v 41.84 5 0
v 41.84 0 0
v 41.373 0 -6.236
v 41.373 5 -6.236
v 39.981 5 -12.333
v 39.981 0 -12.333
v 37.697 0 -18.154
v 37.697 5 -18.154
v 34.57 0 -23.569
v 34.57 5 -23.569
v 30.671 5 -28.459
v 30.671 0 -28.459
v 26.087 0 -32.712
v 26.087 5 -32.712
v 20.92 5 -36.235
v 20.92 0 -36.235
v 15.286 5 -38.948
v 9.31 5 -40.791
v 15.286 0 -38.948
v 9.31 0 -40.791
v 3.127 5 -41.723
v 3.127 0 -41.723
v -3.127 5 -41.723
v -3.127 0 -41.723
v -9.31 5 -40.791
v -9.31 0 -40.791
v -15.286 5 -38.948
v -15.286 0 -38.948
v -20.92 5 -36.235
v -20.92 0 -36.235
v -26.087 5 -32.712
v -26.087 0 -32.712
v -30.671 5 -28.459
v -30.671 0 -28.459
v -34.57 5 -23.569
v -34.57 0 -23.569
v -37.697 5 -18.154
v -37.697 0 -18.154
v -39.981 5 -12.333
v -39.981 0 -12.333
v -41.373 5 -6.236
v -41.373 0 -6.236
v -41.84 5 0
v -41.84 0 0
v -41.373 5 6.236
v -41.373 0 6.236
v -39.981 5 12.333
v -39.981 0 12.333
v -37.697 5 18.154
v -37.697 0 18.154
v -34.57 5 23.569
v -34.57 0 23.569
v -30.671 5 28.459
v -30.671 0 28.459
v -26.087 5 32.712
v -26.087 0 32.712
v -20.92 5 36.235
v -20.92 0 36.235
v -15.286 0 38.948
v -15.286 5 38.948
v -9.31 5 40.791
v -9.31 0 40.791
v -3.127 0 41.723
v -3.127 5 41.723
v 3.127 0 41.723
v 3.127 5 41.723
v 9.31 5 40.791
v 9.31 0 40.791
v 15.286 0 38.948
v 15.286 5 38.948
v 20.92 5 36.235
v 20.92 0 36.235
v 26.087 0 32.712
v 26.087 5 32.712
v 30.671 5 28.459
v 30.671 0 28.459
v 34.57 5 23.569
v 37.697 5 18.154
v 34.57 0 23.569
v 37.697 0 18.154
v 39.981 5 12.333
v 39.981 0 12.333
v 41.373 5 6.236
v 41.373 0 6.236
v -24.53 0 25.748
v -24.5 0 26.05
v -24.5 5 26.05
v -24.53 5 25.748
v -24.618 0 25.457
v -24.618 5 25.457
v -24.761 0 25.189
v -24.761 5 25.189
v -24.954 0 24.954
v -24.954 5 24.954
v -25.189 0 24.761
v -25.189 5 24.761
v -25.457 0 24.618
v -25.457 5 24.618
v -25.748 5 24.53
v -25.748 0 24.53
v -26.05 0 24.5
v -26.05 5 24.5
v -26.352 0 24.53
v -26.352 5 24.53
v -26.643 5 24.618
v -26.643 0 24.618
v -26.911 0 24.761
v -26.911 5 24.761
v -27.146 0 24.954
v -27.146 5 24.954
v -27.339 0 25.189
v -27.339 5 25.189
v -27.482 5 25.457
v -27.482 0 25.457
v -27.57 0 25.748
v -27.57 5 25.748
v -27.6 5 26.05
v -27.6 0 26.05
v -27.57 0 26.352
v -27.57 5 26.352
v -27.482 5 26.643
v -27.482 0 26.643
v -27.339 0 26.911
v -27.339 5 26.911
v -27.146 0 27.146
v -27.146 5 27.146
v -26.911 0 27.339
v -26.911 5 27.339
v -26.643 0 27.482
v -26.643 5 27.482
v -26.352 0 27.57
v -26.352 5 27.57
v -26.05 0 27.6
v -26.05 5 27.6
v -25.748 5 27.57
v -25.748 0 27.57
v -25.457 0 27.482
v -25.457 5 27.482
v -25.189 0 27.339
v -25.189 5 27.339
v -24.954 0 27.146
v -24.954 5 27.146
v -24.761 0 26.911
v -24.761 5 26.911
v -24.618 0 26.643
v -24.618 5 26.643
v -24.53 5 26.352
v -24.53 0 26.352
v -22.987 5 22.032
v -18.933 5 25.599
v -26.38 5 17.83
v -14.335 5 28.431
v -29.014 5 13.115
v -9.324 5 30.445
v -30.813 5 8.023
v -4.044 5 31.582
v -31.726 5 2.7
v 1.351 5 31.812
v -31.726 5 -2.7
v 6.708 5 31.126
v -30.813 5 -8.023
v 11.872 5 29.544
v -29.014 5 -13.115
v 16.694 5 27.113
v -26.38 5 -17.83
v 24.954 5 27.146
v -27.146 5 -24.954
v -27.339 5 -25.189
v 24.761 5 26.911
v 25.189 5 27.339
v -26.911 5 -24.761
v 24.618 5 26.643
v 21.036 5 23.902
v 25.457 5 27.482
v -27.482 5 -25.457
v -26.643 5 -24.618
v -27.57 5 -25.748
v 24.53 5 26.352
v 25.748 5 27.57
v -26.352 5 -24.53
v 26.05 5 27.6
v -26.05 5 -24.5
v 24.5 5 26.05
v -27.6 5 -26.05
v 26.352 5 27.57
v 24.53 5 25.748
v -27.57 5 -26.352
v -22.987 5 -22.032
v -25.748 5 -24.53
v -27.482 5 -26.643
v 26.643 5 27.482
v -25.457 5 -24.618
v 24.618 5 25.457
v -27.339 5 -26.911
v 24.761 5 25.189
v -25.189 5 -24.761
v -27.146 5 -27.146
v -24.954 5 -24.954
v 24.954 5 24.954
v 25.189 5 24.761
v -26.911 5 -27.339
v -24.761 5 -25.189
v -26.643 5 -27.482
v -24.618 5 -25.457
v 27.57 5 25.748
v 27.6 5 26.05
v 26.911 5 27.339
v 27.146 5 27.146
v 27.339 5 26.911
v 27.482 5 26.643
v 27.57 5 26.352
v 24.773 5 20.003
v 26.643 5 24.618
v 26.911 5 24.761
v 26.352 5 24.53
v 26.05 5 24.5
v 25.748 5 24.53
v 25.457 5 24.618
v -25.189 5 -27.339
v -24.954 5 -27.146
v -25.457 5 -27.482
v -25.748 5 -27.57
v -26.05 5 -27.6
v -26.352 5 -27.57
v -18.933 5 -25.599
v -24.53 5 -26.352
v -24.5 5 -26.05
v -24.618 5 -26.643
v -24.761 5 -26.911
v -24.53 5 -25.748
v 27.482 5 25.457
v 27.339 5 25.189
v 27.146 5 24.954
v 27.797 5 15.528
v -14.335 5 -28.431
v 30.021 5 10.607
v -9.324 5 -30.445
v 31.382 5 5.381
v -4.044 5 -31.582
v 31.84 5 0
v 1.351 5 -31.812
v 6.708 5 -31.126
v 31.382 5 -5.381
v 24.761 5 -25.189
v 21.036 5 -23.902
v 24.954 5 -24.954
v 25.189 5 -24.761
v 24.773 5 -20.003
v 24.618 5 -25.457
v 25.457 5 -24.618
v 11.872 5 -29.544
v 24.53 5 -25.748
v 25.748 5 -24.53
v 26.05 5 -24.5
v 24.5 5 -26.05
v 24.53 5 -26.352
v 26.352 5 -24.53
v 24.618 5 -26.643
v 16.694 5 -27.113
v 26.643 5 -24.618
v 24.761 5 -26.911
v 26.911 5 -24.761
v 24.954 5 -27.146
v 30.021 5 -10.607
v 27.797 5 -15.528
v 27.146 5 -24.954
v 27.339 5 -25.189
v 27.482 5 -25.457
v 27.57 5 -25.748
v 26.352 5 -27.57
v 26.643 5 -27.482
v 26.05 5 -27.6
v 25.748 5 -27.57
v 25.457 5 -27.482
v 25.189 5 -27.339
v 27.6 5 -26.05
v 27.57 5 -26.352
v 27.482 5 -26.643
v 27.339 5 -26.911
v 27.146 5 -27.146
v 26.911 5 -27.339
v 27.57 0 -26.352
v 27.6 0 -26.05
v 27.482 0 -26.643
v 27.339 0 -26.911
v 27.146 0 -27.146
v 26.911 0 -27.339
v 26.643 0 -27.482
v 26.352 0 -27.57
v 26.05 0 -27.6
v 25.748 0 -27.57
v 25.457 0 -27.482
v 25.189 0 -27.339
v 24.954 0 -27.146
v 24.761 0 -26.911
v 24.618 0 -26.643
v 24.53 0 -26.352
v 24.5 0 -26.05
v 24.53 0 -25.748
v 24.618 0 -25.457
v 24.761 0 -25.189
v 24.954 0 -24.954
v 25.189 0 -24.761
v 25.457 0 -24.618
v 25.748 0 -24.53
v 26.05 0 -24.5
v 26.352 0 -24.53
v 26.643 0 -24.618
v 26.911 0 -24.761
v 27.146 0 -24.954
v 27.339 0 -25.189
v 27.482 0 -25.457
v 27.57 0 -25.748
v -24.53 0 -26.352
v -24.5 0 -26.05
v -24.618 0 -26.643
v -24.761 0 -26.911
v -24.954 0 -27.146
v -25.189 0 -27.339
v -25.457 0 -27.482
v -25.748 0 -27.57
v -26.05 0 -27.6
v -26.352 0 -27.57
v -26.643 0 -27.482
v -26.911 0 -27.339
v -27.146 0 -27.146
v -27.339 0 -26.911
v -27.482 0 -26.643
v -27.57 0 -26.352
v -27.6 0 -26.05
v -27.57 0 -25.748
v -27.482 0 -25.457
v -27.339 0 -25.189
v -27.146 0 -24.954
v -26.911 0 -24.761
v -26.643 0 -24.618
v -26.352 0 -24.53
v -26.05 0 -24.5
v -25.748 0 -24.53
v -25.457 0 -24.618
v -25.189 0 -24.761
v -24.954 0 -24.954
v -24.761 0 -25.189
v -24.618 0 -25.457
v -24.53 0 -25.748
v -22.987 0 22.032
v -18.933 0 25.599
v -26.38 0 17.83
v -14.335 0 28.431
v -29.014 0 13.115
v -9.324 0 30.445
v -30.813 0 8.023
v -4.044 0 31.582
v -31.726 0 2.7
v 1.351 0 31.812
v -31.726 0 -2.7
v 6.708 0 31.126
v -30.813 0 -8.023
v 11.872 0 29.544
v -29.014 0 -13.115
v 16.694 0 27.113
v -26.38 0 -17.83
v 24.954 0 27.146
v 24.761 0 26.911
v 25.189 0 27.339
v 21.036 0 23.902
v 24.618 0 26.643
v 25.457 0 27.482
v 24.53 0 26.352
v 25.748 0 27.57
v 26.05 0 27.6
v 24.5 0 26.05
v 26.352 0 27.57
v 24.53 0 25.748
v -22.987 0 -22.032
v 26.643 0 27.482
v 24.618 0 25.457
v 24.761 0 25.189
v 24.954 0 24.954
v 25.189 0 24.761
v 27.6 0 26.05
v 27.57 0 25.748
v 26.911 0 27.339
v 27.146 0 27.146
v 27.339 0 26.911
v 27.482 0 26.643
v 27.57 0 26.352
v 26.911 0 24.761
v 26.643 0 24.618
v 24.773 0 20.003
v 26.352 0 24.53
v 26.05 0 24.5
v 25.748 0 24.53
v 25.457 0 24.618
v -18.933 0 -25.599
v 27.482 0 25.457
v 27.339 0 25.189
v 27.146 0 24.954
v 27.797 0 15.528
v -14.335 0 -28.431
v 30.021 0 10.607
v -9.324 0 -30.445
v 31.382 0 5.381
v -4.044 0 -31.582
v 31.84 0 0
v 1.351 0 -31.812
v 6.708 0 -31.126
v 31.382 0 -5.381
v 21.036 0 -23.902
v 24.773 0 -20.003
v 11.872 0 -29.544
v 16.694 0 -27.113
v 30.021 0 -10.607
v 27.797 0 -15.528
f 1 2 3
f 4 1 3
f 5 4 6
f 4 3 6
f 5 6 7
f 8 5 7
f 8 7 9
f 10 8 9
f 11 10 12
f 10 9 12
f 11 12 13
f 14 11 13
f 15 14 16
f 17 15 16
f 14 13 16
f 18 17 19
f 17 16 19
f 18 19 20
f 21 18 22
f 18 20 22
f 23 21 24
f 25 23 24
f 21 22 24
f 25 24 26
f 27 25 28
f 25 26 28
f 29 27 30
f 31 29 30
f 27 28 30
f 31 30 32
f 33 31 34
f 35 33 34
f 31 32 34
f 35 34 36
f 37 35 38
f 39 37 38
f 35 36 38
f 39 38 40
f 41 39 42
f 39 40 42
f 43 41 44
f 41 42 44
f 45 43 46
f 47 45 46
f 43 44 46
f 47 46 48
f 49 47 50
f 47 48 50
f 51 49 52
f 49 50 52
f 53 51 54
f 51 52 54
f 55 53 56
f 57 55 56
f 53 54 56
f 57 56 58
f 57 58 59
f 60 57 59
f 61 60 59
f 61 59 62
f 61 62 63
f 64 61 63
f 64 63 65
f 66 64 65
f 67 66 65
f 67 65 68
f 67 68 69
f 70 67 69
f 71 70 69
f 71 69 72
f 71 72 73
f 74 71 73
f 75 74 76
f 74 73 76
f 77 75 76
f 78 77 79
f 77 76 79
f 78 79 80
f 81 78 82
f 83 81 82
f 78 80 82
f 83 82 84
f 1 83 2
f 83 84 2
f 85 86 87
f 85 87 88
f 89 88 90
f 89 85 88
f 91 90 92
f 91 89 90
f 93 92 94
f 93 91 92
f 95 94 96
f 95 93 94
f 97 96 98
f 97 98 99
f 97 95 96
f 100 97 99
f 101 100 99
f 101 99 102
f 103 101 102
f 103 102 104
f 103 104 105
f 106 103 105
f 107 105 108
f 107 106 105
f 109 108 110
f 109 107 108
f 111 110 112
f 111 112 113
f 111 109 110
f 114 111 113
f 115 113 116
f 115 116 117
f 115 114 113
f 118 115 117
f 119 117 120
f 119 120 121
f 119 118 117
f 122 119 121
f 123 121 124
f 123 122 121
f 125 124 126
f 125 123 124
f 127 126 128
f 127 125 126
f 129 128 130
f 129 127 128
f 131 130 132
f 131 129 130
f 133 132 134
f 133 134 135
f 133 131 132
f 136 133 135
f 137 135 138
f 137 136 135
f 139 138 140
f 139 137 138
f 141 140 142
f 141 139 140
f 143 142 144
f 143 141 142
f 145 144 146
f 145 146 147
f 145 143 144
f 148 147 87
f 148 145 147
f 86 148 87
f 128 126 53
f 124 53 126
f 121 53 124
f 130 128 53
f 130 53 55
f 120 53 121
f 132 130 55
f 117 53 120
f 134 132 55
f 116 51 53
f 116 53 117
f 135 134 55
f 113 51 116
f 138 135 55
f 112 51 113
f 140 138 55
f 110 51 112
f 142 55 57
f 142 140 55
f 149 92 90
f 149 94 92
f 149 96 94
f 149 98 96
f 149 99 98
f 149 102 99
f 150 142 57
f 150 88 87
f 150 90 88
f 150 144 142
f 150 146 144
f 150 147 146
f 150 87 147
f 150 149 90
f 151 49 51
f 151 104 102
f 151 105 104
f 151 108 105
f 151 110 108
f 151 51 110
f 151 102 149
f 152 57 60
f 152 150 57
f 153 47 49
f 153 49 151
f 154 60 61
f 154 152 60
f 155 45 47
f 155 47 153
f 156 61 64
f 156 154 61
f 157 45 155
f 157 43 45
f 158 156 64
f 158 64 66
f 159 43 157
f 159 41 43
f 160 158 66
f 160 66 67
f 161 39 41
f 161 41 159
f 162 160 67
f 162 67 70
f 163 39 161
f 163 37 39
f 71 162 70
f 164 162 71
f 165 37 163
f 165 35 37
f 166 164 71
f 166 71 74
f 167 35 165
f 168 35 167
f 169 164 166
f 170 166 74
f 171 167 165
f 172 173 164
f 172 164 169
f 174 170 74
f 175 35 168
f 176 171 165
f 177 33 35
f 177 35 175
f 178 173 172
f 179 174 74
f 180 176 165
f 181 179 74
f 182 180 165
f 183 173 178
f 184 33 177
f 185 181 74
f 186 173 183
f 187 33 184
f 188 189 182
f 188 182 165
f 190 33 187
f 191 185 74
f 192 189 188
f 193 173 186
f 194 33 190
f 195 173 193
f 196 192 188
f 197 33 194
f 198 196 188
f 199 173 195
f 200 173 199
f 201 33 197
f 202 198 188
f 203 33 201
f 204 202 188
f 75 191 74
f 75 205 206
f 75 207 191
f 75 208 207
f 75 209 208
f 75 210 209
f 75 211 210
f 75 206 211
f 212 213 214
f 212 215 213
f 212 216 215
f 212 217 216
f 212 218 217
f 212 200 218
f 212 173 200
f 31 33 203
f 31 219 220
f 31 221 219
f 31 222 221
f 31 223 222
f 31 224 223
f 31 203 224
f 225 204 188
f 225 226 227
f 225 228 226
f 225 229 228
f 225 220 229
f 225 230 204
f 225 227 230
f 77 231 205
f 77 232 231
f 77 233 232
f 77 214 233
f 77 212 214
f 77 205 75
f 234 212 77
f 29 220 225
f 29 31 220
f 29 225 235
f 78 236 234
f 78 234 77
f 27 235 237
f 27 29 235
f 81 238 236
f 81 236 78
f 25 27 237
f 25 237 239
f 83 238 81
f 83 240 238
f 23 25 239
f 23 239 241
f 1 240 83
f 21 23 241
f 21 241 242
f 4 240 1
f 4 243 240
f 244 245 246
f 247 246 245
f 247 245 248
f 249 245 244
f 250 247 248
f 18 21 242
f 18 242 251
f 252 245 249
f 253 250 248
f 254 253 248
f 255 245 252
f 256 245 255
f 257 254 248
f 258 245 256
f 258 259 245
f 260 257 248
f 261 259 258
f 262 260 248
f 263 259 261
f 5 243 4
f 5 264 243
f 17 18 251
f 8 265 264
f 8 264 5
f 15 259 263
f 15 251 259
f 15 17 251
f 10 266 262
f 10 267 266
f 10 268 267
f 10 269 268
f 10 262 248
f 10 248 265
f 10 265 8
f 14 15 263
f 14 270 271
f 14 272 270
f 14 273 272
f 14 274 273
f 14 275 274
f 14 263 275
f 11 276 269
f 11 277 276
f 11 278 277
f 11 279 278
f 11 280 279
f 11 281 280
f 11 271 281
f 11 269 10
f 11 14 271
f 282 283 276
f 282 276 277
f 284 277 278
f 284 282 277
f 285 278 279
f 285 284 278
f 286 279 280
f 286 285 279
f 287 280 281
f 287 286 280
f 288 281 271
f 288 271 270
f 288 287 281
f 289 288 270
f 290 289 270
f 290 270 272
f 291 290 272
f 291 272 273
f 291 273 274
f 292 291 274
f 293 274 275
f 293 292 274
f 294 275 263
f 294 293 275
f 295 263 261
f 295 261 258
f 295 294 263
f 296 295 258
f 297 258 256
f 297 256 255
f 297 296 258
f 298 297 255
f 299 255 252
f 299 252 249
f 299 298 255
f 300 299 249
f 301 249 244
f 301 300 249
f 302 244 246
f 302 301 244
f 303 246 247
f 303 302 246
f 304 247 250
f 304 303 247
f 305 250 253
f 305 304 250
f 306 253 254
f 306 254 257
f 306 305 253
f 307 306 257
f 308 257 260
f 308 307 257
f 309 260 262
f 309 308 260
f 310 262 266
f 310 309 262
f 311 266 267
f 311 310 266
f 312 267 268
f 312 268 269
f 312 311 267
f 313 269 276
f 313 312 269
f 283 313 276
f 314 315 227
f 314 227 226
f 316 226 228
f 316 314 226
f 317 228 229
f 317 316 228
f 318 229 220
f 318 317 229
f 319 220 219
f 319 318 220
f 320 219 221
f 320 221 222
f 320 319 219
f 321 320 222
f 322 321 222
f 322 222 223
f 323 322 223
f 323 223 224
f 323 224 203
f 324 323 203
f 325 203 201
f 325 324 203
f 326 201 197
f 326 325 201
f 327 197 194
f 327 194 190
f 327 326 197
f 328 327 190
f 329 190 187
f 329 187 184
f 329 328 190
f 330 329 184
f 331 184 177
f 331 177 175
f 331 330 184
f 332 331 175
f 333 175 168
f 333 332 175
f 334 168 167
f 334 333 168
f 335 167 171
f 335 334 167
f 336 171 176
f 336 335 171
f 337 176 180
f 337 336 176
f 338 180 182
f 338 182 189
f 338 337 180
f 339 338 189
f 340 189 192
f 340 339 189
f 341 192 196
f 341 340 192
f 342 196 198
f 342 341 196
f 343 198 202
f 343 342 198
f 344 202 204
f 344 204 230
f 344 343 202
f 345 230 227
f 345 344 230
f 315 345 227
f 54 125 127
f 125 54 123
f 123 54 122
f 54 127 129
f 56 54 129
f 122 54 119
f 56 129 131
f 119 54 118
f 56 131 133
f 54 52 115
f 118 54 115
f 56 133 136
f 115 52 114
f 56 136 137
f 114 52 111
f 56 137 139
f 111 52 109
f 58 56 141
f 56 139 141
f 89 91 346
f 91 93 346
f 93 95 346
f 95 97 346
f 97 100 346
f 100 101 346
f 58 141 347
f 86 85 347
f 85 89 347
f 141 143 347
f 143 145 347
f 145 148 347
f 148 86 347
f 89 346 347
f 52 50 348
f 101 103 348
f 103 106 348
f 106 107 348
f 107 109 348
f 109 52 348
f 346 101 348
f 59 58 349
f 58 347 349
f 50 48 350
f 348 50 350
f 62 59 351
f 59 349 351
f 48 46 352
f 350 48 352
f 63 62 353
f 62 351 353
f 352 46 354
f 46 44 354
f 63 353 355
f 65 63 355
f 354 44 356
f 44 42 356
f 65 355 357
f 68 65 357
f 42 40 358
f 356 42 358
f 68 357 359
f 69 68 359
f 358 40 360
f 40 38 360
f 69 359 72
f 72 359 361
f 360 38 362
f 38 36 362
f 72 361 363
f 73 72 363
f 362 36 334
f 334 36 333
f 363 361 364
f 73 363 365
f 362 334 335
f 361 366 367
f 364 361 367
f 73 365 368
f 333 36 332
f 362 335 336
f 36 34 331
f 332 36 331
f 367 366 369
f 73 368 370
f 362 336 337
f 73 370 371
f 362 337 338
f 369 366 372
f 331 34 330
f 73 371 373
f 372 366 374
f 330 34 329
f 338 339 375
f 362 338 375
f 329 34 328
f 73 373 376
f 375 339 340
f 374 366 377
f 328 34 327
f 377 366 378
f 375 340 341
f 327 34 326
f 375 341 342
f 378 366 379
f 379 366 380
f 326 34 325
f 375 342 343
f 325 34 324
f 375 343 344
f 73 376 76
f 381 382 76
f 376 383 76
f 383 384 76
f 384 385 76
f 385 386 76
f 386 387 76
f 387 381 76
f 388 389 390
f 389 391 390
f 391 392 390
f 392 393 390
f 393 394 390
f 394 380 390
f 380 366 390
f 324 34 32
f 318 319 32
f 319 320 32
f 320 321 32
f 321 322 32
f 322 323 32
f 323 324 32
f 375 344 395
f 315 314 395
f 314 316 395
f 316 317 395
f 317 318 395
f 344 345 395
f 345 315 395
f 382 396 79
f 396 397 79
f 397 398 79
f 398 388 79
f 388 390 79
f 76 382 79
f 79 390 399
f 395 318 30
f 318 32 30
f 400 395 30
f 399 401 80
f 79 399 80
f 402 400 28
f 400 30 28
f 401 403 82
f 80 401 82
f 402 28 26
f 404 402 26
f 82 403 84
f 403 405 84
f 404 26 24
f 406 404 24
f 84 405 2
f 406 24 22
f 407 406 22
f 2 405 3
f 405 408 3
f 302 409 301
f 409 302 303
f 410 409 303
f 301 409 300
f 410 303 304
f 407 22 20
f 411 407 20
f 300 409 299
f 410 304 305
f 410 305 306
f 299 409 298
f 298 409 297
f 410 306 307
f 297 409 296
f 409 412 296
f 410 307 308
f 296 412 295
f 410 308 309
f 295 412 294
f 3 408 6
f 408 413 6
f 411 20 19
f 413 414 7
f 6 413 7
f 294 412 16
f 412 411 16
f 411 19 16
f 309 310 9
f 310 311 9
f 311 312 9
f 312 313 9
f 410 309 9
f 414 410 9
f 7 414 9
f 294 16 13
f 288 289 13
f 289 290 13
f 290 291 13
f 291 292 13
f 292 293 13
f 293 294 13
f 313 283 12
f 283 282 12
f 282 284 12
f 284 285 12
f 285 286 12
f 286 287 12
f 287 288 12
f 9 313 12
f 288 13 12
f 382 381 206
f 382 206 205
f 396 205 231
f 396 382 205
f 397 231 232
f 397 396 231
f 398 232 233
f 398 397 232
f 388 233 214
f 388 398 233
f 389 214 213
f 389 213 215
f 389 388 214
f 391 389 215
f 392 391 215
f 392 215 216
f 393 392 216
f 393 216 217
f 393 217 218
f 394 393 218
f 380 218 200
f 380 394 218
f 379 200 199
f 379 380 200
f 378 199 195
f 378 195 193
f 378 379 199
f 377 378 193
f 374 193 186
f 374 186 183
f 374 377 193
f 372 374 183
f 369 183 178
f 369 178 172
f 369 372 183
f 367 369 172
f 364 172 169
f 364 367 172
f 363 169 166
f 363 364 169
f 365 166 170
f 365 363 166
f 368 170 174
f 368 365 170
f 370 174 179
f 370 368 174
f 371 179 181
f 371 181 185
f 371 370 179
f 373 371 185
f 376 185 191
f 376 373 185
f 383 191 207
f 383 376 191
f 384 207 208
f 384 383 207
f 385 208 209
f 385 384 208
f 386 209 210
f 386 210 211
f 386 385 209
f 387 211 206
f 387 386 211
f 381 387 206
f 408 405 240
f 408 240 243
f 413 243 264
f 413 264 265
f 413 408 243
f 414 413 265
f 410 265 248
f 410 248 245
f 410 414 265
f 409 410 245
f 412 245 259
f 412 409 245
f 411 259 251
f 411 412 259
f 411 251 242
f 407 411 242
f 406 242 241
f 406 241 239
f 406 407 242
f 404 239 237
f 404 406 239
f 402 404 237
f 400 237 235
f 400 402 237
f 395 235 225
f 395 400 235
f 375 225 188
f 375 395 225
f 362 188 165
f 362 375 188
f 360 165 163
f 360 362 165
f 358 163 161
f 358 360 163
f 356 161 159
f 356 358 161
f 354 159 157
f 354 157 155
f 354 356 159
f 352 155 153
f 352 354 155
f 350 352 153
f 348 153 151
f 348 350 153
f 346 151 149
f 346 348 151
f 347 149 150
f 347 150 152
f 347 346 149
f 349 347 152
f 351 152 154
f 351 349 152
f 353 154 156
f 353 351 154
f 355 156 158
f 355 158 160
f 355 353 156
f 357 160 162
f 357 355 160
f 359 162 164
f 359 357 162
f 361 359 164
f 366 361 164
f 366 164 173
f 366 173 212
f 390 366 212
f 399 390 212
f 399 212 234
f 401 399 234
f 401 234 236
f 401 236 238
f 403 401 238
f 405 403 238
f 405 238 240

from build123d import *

# Parameters (mm, degrees)
CROQUIS1_R              = 41.8402633
CROQUIS1_R_2            = 1.55
CROQUIS1_R_3            = 31.8402633
SALIENTE_EXTRUIR1_DEPTH = 5


with BuildPart() as part:
    # Croquis1 → Saliente-Extruir1 (new body)
    with BuildSketch(Plane(origin=(0, 0, 0), x_dir=(1, 0, 0), z_dir=(0, 1, 0))):
        Circle(CROQUIS1_R)
        with Locations((-26.05, 26.05)):
            Circle(CROQUIS1_R_2, mode=Mode.SUBTRACT)
        Circle(CROQUIS1_R_3, mode=Mode.SUBTRACT)
        with Locations((26.05, 26.05)):
            Circle(CROQUIS1_R_2, mode=Mode.SUBTRACT)
        with Locations((26.05, -26.05)):
            Circle(CROQUIS1_R_2, mode=Mode.SUBTRACT)
        with Locations((-26.05, -26.05)):
            Circle(CROQUIS1_R_2, mode=Mode.SUBTRACT)
    extrude(amount=SALIENTE_EXTRUIR1_DEPTH)


solid = part.part
